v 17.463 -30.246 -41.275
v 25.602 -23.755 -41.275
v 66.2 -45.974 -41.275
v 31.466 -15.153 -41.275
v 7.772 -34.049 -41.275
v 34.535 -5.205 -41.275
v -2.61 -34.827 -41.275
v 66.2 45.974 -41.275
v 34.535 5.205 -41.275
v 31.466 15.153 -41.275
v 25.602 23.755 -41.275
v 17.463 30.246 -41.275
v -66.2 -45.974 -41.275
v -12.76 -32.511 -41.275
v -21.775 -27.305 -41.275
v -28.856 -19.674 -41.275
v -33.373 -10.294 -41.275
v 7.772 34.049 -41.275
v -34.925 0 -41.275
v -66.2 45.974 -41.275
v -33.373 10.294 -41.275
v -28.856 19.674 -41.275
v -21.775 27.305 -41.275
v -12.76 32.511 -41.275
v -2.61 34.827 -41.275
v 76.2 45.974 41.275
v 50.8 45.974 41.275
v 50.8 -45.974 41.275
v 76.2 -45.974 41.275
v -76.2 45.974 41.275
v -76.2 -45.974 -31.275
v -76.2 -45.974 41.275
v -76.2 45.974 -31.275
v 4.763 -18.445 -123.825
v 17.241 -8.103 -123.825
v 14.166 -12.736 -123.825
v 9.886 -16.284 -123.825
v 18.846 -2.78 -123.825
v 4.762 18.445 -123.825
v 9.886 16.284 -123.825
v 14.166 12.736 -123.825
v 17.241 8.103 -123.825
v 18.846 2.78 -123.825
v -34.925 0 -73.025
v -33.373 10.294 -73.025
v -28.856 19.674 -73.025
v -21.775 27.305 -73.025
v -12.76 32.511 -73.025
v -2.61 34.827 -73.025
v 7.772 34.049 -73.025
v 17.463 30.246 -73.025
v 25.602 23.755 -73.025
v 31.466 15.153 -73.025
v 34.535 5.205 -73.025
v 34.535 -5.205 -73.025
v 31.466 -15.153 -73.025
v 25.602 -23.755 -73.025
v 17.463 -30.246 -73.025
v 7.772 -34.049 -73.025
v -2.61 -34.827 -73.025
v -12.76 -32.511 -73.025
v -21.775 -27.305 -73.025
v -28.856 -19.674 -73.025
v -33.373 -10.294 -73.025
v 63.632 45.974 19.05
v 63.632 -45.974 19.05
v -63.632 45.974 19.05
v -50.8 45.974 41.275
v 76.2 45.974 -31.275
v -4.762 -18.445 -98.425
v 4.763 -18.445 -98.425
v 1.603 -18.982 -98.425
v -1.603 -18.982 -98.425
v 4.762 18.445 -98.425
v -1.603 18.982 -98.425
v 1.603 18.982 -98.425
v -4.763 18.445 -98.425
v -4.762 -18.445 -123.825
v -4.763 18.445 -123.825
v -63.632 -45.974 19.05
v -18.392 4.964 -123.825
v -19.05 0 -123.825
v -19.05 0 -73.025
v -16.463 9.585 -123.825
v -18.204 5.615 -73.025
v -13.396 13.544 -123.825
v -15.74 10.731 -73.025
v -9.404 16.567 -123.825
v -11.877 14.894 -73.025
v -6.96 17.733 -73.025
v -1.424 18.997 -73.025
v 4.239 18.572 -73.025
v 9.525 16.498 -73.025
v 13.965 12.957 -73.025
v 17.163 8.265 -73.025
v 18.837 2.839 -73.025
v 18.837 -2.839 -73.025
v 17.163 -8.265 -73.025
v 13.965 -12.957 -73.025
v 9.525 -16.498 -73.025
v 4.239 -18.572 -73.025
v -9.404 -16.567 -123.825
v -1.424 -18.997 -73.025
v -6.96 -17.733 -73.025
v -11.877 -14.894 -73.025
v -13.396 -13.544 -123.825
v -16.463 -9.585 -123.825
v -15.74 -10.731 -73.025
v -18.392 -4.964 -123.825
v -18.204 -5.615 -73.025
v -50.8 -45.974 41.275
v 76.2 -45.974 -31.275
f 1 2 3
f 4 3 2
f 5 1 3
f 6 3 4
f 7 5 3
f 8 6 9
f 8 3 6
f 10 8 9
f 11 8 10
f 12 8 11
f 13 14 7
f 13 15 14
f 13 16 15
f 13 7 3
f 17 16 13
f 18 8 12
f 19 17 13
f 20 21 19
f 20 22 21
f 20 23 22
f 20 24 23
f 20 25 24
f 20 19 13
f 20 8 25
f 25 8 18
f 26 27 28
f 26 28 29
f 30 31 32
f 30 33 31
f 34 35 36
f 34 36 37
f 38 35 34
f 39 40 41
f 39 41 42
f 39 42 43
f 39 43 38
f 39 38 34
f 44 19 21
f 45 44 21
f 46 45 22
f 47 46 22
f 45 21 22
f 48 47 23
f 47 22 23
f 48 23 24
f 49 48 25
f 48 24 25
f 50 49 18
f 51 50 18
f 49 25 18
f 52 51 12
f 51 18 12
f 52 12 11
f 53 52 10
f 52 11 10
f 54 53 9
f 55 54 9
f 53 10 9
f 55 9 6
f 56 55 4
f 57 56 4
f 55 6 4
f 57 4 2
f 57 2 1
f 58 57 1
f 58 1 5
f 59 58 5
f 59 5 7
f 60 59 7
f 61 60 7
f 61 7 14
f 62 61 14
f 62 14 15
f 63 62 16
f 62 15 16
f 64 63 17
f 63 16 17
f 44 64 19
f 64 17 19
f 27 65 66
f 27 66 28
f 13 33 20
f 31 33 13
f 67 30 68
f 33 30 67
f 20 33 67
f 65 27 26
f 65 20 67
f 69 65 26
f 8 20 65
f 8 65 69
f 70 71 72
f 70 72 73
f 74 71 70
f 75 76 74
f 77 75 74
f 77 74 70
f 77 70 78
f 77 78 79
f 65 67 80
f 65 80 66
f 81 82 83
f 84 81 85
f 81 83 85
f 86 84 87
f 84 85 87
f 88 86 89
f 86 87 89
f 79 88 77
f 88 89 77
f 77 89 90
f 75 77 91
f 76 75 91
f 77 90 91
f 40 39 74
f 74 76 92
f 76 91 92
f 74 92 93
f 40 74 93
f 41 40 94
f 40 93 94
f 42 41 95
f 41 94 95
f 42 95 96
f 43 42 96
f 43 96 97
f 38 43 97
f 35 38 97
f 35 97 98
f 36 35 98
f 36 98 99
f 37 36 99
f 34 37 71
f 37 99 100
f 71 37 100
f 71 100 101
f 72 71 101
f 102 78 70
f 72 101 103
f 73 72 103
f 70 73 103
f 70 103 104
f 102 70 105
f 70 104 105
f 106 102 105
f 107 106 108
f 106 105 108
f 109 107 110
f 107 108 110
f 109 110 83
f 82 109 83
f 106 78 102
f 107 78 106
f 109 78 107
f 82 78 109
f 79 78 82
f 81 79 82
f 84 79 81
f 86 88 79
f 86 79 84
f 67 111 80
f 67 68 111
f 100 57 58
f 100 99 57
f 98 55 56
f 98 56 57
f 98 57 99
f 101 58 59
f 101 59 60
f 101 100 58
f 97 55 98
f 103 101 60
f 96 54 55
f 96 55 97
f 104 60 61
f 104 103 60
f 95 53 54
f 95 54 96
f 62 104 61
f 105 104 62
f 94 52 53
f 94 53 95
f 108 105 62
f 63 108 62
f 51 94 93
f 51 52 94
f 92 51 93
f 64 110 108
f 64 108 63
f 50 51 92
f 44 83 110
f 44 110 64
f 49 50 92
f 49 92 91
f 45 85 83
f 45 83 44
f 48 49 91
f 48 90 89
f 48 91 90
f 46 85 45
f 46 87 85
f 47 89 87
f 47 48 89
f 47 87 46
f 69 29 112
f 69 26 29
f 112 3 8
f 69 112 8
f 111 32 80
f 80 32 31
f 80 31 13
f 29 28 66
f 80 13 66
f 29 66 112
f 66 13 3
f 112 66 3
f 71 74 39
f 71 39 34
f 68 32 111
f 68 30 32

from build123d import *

# Parameters (mm, degrees)
BOSS_EXTRUDE1_DEPTH = 45.974
SKETCH2_R           = 34.925
BOSS_EXTRUDE2_DEPTH = 31.75
SKETCH3_R           = 19.05
BOSS_EXTRUDE3_DEPTH = 50.8
CUT_EXTRUDE1_START  = -25.4
CUT_EXTRUDE1_DEPTH  = 25.4
CHAMFER1_SIZE       = 10


with BuildPart() as part:
    # Sketch1 → Boss-Extrude1 (new, symmetric)
    with BuildSketch(Plane(origin=(0, 0, 0), x_dir=(1, 0, 0), z_dir=(0, 1, 0))):
        Polygon((-50.8, -41.275), (-63.631609733, -19.05), (63.631609733, -19.05), (50.8, -41.275), (76.2, -41.275), (76.2, 41.275), (-76.2, 41.275), (-76.2, -41.275), align=None)
    extrude(amount=BOSS_EXTRUDE1_DEPTH, both=True)

    # Sketch2 → Boss-Extrude2 (add)
    with BuildSketch(Plane(origin=(0, 0, -41.275), x_dir=(-1, 0, 0), z_dir=(0, 0, -1))):
        Circle(SKETCH2_R)
    extrude(amount=BOSS_EXTRUDE2_DEPTH)

    # Sketch3 → Boss-Extrude3 (add)
    with BuildSketch(Plane(origin=(0, 0, -73.025), x_dir=(-1, 0, 0), z_dir=(0, 0, -1))):
        Circle(SKETCH3_R)
    extrude(amount=BOSS_EXTRUDE3_DEPTH)

    # Sketch4 → Cut-Extrude1 (cut)
    with BuildSketch(Plane(origin=(0, 0, -123.825), x_dir=(-1, 0, 0), z_dir=(0, 0, -1)).offset(CUT_EXTRUDE1_START)):
        with BuildLine():
            Line((-4.7625, 18.445083186), (-4.7625, -18.445083186))
            ThreePointArc((-4.7625, -18.445083186), (0, -19.05), (4.7625, -18.445083186))
            Line((4.7625, -18.445083186), (4.7625, 18.445083186))
            ThreePointArc((4.7625, 18.445083186), (0, 19.05), (-4.7625, 18.445083186))
        make_face()
    extrude(amount=CUT_EXTRUDE1_DEPTH, mode=Mode.SUBTRACT)

    # Chamfer1
    chamfer1_edges = [part.edges().sort_by_distance(p)[0] for p in [
        (-76.2, 0, -41.275),
        (76.2, 0, -41.275),
    ]]
    chamfer(chamfer1_edges, length=CHAMFER1_SIZE)


solid = part.part
